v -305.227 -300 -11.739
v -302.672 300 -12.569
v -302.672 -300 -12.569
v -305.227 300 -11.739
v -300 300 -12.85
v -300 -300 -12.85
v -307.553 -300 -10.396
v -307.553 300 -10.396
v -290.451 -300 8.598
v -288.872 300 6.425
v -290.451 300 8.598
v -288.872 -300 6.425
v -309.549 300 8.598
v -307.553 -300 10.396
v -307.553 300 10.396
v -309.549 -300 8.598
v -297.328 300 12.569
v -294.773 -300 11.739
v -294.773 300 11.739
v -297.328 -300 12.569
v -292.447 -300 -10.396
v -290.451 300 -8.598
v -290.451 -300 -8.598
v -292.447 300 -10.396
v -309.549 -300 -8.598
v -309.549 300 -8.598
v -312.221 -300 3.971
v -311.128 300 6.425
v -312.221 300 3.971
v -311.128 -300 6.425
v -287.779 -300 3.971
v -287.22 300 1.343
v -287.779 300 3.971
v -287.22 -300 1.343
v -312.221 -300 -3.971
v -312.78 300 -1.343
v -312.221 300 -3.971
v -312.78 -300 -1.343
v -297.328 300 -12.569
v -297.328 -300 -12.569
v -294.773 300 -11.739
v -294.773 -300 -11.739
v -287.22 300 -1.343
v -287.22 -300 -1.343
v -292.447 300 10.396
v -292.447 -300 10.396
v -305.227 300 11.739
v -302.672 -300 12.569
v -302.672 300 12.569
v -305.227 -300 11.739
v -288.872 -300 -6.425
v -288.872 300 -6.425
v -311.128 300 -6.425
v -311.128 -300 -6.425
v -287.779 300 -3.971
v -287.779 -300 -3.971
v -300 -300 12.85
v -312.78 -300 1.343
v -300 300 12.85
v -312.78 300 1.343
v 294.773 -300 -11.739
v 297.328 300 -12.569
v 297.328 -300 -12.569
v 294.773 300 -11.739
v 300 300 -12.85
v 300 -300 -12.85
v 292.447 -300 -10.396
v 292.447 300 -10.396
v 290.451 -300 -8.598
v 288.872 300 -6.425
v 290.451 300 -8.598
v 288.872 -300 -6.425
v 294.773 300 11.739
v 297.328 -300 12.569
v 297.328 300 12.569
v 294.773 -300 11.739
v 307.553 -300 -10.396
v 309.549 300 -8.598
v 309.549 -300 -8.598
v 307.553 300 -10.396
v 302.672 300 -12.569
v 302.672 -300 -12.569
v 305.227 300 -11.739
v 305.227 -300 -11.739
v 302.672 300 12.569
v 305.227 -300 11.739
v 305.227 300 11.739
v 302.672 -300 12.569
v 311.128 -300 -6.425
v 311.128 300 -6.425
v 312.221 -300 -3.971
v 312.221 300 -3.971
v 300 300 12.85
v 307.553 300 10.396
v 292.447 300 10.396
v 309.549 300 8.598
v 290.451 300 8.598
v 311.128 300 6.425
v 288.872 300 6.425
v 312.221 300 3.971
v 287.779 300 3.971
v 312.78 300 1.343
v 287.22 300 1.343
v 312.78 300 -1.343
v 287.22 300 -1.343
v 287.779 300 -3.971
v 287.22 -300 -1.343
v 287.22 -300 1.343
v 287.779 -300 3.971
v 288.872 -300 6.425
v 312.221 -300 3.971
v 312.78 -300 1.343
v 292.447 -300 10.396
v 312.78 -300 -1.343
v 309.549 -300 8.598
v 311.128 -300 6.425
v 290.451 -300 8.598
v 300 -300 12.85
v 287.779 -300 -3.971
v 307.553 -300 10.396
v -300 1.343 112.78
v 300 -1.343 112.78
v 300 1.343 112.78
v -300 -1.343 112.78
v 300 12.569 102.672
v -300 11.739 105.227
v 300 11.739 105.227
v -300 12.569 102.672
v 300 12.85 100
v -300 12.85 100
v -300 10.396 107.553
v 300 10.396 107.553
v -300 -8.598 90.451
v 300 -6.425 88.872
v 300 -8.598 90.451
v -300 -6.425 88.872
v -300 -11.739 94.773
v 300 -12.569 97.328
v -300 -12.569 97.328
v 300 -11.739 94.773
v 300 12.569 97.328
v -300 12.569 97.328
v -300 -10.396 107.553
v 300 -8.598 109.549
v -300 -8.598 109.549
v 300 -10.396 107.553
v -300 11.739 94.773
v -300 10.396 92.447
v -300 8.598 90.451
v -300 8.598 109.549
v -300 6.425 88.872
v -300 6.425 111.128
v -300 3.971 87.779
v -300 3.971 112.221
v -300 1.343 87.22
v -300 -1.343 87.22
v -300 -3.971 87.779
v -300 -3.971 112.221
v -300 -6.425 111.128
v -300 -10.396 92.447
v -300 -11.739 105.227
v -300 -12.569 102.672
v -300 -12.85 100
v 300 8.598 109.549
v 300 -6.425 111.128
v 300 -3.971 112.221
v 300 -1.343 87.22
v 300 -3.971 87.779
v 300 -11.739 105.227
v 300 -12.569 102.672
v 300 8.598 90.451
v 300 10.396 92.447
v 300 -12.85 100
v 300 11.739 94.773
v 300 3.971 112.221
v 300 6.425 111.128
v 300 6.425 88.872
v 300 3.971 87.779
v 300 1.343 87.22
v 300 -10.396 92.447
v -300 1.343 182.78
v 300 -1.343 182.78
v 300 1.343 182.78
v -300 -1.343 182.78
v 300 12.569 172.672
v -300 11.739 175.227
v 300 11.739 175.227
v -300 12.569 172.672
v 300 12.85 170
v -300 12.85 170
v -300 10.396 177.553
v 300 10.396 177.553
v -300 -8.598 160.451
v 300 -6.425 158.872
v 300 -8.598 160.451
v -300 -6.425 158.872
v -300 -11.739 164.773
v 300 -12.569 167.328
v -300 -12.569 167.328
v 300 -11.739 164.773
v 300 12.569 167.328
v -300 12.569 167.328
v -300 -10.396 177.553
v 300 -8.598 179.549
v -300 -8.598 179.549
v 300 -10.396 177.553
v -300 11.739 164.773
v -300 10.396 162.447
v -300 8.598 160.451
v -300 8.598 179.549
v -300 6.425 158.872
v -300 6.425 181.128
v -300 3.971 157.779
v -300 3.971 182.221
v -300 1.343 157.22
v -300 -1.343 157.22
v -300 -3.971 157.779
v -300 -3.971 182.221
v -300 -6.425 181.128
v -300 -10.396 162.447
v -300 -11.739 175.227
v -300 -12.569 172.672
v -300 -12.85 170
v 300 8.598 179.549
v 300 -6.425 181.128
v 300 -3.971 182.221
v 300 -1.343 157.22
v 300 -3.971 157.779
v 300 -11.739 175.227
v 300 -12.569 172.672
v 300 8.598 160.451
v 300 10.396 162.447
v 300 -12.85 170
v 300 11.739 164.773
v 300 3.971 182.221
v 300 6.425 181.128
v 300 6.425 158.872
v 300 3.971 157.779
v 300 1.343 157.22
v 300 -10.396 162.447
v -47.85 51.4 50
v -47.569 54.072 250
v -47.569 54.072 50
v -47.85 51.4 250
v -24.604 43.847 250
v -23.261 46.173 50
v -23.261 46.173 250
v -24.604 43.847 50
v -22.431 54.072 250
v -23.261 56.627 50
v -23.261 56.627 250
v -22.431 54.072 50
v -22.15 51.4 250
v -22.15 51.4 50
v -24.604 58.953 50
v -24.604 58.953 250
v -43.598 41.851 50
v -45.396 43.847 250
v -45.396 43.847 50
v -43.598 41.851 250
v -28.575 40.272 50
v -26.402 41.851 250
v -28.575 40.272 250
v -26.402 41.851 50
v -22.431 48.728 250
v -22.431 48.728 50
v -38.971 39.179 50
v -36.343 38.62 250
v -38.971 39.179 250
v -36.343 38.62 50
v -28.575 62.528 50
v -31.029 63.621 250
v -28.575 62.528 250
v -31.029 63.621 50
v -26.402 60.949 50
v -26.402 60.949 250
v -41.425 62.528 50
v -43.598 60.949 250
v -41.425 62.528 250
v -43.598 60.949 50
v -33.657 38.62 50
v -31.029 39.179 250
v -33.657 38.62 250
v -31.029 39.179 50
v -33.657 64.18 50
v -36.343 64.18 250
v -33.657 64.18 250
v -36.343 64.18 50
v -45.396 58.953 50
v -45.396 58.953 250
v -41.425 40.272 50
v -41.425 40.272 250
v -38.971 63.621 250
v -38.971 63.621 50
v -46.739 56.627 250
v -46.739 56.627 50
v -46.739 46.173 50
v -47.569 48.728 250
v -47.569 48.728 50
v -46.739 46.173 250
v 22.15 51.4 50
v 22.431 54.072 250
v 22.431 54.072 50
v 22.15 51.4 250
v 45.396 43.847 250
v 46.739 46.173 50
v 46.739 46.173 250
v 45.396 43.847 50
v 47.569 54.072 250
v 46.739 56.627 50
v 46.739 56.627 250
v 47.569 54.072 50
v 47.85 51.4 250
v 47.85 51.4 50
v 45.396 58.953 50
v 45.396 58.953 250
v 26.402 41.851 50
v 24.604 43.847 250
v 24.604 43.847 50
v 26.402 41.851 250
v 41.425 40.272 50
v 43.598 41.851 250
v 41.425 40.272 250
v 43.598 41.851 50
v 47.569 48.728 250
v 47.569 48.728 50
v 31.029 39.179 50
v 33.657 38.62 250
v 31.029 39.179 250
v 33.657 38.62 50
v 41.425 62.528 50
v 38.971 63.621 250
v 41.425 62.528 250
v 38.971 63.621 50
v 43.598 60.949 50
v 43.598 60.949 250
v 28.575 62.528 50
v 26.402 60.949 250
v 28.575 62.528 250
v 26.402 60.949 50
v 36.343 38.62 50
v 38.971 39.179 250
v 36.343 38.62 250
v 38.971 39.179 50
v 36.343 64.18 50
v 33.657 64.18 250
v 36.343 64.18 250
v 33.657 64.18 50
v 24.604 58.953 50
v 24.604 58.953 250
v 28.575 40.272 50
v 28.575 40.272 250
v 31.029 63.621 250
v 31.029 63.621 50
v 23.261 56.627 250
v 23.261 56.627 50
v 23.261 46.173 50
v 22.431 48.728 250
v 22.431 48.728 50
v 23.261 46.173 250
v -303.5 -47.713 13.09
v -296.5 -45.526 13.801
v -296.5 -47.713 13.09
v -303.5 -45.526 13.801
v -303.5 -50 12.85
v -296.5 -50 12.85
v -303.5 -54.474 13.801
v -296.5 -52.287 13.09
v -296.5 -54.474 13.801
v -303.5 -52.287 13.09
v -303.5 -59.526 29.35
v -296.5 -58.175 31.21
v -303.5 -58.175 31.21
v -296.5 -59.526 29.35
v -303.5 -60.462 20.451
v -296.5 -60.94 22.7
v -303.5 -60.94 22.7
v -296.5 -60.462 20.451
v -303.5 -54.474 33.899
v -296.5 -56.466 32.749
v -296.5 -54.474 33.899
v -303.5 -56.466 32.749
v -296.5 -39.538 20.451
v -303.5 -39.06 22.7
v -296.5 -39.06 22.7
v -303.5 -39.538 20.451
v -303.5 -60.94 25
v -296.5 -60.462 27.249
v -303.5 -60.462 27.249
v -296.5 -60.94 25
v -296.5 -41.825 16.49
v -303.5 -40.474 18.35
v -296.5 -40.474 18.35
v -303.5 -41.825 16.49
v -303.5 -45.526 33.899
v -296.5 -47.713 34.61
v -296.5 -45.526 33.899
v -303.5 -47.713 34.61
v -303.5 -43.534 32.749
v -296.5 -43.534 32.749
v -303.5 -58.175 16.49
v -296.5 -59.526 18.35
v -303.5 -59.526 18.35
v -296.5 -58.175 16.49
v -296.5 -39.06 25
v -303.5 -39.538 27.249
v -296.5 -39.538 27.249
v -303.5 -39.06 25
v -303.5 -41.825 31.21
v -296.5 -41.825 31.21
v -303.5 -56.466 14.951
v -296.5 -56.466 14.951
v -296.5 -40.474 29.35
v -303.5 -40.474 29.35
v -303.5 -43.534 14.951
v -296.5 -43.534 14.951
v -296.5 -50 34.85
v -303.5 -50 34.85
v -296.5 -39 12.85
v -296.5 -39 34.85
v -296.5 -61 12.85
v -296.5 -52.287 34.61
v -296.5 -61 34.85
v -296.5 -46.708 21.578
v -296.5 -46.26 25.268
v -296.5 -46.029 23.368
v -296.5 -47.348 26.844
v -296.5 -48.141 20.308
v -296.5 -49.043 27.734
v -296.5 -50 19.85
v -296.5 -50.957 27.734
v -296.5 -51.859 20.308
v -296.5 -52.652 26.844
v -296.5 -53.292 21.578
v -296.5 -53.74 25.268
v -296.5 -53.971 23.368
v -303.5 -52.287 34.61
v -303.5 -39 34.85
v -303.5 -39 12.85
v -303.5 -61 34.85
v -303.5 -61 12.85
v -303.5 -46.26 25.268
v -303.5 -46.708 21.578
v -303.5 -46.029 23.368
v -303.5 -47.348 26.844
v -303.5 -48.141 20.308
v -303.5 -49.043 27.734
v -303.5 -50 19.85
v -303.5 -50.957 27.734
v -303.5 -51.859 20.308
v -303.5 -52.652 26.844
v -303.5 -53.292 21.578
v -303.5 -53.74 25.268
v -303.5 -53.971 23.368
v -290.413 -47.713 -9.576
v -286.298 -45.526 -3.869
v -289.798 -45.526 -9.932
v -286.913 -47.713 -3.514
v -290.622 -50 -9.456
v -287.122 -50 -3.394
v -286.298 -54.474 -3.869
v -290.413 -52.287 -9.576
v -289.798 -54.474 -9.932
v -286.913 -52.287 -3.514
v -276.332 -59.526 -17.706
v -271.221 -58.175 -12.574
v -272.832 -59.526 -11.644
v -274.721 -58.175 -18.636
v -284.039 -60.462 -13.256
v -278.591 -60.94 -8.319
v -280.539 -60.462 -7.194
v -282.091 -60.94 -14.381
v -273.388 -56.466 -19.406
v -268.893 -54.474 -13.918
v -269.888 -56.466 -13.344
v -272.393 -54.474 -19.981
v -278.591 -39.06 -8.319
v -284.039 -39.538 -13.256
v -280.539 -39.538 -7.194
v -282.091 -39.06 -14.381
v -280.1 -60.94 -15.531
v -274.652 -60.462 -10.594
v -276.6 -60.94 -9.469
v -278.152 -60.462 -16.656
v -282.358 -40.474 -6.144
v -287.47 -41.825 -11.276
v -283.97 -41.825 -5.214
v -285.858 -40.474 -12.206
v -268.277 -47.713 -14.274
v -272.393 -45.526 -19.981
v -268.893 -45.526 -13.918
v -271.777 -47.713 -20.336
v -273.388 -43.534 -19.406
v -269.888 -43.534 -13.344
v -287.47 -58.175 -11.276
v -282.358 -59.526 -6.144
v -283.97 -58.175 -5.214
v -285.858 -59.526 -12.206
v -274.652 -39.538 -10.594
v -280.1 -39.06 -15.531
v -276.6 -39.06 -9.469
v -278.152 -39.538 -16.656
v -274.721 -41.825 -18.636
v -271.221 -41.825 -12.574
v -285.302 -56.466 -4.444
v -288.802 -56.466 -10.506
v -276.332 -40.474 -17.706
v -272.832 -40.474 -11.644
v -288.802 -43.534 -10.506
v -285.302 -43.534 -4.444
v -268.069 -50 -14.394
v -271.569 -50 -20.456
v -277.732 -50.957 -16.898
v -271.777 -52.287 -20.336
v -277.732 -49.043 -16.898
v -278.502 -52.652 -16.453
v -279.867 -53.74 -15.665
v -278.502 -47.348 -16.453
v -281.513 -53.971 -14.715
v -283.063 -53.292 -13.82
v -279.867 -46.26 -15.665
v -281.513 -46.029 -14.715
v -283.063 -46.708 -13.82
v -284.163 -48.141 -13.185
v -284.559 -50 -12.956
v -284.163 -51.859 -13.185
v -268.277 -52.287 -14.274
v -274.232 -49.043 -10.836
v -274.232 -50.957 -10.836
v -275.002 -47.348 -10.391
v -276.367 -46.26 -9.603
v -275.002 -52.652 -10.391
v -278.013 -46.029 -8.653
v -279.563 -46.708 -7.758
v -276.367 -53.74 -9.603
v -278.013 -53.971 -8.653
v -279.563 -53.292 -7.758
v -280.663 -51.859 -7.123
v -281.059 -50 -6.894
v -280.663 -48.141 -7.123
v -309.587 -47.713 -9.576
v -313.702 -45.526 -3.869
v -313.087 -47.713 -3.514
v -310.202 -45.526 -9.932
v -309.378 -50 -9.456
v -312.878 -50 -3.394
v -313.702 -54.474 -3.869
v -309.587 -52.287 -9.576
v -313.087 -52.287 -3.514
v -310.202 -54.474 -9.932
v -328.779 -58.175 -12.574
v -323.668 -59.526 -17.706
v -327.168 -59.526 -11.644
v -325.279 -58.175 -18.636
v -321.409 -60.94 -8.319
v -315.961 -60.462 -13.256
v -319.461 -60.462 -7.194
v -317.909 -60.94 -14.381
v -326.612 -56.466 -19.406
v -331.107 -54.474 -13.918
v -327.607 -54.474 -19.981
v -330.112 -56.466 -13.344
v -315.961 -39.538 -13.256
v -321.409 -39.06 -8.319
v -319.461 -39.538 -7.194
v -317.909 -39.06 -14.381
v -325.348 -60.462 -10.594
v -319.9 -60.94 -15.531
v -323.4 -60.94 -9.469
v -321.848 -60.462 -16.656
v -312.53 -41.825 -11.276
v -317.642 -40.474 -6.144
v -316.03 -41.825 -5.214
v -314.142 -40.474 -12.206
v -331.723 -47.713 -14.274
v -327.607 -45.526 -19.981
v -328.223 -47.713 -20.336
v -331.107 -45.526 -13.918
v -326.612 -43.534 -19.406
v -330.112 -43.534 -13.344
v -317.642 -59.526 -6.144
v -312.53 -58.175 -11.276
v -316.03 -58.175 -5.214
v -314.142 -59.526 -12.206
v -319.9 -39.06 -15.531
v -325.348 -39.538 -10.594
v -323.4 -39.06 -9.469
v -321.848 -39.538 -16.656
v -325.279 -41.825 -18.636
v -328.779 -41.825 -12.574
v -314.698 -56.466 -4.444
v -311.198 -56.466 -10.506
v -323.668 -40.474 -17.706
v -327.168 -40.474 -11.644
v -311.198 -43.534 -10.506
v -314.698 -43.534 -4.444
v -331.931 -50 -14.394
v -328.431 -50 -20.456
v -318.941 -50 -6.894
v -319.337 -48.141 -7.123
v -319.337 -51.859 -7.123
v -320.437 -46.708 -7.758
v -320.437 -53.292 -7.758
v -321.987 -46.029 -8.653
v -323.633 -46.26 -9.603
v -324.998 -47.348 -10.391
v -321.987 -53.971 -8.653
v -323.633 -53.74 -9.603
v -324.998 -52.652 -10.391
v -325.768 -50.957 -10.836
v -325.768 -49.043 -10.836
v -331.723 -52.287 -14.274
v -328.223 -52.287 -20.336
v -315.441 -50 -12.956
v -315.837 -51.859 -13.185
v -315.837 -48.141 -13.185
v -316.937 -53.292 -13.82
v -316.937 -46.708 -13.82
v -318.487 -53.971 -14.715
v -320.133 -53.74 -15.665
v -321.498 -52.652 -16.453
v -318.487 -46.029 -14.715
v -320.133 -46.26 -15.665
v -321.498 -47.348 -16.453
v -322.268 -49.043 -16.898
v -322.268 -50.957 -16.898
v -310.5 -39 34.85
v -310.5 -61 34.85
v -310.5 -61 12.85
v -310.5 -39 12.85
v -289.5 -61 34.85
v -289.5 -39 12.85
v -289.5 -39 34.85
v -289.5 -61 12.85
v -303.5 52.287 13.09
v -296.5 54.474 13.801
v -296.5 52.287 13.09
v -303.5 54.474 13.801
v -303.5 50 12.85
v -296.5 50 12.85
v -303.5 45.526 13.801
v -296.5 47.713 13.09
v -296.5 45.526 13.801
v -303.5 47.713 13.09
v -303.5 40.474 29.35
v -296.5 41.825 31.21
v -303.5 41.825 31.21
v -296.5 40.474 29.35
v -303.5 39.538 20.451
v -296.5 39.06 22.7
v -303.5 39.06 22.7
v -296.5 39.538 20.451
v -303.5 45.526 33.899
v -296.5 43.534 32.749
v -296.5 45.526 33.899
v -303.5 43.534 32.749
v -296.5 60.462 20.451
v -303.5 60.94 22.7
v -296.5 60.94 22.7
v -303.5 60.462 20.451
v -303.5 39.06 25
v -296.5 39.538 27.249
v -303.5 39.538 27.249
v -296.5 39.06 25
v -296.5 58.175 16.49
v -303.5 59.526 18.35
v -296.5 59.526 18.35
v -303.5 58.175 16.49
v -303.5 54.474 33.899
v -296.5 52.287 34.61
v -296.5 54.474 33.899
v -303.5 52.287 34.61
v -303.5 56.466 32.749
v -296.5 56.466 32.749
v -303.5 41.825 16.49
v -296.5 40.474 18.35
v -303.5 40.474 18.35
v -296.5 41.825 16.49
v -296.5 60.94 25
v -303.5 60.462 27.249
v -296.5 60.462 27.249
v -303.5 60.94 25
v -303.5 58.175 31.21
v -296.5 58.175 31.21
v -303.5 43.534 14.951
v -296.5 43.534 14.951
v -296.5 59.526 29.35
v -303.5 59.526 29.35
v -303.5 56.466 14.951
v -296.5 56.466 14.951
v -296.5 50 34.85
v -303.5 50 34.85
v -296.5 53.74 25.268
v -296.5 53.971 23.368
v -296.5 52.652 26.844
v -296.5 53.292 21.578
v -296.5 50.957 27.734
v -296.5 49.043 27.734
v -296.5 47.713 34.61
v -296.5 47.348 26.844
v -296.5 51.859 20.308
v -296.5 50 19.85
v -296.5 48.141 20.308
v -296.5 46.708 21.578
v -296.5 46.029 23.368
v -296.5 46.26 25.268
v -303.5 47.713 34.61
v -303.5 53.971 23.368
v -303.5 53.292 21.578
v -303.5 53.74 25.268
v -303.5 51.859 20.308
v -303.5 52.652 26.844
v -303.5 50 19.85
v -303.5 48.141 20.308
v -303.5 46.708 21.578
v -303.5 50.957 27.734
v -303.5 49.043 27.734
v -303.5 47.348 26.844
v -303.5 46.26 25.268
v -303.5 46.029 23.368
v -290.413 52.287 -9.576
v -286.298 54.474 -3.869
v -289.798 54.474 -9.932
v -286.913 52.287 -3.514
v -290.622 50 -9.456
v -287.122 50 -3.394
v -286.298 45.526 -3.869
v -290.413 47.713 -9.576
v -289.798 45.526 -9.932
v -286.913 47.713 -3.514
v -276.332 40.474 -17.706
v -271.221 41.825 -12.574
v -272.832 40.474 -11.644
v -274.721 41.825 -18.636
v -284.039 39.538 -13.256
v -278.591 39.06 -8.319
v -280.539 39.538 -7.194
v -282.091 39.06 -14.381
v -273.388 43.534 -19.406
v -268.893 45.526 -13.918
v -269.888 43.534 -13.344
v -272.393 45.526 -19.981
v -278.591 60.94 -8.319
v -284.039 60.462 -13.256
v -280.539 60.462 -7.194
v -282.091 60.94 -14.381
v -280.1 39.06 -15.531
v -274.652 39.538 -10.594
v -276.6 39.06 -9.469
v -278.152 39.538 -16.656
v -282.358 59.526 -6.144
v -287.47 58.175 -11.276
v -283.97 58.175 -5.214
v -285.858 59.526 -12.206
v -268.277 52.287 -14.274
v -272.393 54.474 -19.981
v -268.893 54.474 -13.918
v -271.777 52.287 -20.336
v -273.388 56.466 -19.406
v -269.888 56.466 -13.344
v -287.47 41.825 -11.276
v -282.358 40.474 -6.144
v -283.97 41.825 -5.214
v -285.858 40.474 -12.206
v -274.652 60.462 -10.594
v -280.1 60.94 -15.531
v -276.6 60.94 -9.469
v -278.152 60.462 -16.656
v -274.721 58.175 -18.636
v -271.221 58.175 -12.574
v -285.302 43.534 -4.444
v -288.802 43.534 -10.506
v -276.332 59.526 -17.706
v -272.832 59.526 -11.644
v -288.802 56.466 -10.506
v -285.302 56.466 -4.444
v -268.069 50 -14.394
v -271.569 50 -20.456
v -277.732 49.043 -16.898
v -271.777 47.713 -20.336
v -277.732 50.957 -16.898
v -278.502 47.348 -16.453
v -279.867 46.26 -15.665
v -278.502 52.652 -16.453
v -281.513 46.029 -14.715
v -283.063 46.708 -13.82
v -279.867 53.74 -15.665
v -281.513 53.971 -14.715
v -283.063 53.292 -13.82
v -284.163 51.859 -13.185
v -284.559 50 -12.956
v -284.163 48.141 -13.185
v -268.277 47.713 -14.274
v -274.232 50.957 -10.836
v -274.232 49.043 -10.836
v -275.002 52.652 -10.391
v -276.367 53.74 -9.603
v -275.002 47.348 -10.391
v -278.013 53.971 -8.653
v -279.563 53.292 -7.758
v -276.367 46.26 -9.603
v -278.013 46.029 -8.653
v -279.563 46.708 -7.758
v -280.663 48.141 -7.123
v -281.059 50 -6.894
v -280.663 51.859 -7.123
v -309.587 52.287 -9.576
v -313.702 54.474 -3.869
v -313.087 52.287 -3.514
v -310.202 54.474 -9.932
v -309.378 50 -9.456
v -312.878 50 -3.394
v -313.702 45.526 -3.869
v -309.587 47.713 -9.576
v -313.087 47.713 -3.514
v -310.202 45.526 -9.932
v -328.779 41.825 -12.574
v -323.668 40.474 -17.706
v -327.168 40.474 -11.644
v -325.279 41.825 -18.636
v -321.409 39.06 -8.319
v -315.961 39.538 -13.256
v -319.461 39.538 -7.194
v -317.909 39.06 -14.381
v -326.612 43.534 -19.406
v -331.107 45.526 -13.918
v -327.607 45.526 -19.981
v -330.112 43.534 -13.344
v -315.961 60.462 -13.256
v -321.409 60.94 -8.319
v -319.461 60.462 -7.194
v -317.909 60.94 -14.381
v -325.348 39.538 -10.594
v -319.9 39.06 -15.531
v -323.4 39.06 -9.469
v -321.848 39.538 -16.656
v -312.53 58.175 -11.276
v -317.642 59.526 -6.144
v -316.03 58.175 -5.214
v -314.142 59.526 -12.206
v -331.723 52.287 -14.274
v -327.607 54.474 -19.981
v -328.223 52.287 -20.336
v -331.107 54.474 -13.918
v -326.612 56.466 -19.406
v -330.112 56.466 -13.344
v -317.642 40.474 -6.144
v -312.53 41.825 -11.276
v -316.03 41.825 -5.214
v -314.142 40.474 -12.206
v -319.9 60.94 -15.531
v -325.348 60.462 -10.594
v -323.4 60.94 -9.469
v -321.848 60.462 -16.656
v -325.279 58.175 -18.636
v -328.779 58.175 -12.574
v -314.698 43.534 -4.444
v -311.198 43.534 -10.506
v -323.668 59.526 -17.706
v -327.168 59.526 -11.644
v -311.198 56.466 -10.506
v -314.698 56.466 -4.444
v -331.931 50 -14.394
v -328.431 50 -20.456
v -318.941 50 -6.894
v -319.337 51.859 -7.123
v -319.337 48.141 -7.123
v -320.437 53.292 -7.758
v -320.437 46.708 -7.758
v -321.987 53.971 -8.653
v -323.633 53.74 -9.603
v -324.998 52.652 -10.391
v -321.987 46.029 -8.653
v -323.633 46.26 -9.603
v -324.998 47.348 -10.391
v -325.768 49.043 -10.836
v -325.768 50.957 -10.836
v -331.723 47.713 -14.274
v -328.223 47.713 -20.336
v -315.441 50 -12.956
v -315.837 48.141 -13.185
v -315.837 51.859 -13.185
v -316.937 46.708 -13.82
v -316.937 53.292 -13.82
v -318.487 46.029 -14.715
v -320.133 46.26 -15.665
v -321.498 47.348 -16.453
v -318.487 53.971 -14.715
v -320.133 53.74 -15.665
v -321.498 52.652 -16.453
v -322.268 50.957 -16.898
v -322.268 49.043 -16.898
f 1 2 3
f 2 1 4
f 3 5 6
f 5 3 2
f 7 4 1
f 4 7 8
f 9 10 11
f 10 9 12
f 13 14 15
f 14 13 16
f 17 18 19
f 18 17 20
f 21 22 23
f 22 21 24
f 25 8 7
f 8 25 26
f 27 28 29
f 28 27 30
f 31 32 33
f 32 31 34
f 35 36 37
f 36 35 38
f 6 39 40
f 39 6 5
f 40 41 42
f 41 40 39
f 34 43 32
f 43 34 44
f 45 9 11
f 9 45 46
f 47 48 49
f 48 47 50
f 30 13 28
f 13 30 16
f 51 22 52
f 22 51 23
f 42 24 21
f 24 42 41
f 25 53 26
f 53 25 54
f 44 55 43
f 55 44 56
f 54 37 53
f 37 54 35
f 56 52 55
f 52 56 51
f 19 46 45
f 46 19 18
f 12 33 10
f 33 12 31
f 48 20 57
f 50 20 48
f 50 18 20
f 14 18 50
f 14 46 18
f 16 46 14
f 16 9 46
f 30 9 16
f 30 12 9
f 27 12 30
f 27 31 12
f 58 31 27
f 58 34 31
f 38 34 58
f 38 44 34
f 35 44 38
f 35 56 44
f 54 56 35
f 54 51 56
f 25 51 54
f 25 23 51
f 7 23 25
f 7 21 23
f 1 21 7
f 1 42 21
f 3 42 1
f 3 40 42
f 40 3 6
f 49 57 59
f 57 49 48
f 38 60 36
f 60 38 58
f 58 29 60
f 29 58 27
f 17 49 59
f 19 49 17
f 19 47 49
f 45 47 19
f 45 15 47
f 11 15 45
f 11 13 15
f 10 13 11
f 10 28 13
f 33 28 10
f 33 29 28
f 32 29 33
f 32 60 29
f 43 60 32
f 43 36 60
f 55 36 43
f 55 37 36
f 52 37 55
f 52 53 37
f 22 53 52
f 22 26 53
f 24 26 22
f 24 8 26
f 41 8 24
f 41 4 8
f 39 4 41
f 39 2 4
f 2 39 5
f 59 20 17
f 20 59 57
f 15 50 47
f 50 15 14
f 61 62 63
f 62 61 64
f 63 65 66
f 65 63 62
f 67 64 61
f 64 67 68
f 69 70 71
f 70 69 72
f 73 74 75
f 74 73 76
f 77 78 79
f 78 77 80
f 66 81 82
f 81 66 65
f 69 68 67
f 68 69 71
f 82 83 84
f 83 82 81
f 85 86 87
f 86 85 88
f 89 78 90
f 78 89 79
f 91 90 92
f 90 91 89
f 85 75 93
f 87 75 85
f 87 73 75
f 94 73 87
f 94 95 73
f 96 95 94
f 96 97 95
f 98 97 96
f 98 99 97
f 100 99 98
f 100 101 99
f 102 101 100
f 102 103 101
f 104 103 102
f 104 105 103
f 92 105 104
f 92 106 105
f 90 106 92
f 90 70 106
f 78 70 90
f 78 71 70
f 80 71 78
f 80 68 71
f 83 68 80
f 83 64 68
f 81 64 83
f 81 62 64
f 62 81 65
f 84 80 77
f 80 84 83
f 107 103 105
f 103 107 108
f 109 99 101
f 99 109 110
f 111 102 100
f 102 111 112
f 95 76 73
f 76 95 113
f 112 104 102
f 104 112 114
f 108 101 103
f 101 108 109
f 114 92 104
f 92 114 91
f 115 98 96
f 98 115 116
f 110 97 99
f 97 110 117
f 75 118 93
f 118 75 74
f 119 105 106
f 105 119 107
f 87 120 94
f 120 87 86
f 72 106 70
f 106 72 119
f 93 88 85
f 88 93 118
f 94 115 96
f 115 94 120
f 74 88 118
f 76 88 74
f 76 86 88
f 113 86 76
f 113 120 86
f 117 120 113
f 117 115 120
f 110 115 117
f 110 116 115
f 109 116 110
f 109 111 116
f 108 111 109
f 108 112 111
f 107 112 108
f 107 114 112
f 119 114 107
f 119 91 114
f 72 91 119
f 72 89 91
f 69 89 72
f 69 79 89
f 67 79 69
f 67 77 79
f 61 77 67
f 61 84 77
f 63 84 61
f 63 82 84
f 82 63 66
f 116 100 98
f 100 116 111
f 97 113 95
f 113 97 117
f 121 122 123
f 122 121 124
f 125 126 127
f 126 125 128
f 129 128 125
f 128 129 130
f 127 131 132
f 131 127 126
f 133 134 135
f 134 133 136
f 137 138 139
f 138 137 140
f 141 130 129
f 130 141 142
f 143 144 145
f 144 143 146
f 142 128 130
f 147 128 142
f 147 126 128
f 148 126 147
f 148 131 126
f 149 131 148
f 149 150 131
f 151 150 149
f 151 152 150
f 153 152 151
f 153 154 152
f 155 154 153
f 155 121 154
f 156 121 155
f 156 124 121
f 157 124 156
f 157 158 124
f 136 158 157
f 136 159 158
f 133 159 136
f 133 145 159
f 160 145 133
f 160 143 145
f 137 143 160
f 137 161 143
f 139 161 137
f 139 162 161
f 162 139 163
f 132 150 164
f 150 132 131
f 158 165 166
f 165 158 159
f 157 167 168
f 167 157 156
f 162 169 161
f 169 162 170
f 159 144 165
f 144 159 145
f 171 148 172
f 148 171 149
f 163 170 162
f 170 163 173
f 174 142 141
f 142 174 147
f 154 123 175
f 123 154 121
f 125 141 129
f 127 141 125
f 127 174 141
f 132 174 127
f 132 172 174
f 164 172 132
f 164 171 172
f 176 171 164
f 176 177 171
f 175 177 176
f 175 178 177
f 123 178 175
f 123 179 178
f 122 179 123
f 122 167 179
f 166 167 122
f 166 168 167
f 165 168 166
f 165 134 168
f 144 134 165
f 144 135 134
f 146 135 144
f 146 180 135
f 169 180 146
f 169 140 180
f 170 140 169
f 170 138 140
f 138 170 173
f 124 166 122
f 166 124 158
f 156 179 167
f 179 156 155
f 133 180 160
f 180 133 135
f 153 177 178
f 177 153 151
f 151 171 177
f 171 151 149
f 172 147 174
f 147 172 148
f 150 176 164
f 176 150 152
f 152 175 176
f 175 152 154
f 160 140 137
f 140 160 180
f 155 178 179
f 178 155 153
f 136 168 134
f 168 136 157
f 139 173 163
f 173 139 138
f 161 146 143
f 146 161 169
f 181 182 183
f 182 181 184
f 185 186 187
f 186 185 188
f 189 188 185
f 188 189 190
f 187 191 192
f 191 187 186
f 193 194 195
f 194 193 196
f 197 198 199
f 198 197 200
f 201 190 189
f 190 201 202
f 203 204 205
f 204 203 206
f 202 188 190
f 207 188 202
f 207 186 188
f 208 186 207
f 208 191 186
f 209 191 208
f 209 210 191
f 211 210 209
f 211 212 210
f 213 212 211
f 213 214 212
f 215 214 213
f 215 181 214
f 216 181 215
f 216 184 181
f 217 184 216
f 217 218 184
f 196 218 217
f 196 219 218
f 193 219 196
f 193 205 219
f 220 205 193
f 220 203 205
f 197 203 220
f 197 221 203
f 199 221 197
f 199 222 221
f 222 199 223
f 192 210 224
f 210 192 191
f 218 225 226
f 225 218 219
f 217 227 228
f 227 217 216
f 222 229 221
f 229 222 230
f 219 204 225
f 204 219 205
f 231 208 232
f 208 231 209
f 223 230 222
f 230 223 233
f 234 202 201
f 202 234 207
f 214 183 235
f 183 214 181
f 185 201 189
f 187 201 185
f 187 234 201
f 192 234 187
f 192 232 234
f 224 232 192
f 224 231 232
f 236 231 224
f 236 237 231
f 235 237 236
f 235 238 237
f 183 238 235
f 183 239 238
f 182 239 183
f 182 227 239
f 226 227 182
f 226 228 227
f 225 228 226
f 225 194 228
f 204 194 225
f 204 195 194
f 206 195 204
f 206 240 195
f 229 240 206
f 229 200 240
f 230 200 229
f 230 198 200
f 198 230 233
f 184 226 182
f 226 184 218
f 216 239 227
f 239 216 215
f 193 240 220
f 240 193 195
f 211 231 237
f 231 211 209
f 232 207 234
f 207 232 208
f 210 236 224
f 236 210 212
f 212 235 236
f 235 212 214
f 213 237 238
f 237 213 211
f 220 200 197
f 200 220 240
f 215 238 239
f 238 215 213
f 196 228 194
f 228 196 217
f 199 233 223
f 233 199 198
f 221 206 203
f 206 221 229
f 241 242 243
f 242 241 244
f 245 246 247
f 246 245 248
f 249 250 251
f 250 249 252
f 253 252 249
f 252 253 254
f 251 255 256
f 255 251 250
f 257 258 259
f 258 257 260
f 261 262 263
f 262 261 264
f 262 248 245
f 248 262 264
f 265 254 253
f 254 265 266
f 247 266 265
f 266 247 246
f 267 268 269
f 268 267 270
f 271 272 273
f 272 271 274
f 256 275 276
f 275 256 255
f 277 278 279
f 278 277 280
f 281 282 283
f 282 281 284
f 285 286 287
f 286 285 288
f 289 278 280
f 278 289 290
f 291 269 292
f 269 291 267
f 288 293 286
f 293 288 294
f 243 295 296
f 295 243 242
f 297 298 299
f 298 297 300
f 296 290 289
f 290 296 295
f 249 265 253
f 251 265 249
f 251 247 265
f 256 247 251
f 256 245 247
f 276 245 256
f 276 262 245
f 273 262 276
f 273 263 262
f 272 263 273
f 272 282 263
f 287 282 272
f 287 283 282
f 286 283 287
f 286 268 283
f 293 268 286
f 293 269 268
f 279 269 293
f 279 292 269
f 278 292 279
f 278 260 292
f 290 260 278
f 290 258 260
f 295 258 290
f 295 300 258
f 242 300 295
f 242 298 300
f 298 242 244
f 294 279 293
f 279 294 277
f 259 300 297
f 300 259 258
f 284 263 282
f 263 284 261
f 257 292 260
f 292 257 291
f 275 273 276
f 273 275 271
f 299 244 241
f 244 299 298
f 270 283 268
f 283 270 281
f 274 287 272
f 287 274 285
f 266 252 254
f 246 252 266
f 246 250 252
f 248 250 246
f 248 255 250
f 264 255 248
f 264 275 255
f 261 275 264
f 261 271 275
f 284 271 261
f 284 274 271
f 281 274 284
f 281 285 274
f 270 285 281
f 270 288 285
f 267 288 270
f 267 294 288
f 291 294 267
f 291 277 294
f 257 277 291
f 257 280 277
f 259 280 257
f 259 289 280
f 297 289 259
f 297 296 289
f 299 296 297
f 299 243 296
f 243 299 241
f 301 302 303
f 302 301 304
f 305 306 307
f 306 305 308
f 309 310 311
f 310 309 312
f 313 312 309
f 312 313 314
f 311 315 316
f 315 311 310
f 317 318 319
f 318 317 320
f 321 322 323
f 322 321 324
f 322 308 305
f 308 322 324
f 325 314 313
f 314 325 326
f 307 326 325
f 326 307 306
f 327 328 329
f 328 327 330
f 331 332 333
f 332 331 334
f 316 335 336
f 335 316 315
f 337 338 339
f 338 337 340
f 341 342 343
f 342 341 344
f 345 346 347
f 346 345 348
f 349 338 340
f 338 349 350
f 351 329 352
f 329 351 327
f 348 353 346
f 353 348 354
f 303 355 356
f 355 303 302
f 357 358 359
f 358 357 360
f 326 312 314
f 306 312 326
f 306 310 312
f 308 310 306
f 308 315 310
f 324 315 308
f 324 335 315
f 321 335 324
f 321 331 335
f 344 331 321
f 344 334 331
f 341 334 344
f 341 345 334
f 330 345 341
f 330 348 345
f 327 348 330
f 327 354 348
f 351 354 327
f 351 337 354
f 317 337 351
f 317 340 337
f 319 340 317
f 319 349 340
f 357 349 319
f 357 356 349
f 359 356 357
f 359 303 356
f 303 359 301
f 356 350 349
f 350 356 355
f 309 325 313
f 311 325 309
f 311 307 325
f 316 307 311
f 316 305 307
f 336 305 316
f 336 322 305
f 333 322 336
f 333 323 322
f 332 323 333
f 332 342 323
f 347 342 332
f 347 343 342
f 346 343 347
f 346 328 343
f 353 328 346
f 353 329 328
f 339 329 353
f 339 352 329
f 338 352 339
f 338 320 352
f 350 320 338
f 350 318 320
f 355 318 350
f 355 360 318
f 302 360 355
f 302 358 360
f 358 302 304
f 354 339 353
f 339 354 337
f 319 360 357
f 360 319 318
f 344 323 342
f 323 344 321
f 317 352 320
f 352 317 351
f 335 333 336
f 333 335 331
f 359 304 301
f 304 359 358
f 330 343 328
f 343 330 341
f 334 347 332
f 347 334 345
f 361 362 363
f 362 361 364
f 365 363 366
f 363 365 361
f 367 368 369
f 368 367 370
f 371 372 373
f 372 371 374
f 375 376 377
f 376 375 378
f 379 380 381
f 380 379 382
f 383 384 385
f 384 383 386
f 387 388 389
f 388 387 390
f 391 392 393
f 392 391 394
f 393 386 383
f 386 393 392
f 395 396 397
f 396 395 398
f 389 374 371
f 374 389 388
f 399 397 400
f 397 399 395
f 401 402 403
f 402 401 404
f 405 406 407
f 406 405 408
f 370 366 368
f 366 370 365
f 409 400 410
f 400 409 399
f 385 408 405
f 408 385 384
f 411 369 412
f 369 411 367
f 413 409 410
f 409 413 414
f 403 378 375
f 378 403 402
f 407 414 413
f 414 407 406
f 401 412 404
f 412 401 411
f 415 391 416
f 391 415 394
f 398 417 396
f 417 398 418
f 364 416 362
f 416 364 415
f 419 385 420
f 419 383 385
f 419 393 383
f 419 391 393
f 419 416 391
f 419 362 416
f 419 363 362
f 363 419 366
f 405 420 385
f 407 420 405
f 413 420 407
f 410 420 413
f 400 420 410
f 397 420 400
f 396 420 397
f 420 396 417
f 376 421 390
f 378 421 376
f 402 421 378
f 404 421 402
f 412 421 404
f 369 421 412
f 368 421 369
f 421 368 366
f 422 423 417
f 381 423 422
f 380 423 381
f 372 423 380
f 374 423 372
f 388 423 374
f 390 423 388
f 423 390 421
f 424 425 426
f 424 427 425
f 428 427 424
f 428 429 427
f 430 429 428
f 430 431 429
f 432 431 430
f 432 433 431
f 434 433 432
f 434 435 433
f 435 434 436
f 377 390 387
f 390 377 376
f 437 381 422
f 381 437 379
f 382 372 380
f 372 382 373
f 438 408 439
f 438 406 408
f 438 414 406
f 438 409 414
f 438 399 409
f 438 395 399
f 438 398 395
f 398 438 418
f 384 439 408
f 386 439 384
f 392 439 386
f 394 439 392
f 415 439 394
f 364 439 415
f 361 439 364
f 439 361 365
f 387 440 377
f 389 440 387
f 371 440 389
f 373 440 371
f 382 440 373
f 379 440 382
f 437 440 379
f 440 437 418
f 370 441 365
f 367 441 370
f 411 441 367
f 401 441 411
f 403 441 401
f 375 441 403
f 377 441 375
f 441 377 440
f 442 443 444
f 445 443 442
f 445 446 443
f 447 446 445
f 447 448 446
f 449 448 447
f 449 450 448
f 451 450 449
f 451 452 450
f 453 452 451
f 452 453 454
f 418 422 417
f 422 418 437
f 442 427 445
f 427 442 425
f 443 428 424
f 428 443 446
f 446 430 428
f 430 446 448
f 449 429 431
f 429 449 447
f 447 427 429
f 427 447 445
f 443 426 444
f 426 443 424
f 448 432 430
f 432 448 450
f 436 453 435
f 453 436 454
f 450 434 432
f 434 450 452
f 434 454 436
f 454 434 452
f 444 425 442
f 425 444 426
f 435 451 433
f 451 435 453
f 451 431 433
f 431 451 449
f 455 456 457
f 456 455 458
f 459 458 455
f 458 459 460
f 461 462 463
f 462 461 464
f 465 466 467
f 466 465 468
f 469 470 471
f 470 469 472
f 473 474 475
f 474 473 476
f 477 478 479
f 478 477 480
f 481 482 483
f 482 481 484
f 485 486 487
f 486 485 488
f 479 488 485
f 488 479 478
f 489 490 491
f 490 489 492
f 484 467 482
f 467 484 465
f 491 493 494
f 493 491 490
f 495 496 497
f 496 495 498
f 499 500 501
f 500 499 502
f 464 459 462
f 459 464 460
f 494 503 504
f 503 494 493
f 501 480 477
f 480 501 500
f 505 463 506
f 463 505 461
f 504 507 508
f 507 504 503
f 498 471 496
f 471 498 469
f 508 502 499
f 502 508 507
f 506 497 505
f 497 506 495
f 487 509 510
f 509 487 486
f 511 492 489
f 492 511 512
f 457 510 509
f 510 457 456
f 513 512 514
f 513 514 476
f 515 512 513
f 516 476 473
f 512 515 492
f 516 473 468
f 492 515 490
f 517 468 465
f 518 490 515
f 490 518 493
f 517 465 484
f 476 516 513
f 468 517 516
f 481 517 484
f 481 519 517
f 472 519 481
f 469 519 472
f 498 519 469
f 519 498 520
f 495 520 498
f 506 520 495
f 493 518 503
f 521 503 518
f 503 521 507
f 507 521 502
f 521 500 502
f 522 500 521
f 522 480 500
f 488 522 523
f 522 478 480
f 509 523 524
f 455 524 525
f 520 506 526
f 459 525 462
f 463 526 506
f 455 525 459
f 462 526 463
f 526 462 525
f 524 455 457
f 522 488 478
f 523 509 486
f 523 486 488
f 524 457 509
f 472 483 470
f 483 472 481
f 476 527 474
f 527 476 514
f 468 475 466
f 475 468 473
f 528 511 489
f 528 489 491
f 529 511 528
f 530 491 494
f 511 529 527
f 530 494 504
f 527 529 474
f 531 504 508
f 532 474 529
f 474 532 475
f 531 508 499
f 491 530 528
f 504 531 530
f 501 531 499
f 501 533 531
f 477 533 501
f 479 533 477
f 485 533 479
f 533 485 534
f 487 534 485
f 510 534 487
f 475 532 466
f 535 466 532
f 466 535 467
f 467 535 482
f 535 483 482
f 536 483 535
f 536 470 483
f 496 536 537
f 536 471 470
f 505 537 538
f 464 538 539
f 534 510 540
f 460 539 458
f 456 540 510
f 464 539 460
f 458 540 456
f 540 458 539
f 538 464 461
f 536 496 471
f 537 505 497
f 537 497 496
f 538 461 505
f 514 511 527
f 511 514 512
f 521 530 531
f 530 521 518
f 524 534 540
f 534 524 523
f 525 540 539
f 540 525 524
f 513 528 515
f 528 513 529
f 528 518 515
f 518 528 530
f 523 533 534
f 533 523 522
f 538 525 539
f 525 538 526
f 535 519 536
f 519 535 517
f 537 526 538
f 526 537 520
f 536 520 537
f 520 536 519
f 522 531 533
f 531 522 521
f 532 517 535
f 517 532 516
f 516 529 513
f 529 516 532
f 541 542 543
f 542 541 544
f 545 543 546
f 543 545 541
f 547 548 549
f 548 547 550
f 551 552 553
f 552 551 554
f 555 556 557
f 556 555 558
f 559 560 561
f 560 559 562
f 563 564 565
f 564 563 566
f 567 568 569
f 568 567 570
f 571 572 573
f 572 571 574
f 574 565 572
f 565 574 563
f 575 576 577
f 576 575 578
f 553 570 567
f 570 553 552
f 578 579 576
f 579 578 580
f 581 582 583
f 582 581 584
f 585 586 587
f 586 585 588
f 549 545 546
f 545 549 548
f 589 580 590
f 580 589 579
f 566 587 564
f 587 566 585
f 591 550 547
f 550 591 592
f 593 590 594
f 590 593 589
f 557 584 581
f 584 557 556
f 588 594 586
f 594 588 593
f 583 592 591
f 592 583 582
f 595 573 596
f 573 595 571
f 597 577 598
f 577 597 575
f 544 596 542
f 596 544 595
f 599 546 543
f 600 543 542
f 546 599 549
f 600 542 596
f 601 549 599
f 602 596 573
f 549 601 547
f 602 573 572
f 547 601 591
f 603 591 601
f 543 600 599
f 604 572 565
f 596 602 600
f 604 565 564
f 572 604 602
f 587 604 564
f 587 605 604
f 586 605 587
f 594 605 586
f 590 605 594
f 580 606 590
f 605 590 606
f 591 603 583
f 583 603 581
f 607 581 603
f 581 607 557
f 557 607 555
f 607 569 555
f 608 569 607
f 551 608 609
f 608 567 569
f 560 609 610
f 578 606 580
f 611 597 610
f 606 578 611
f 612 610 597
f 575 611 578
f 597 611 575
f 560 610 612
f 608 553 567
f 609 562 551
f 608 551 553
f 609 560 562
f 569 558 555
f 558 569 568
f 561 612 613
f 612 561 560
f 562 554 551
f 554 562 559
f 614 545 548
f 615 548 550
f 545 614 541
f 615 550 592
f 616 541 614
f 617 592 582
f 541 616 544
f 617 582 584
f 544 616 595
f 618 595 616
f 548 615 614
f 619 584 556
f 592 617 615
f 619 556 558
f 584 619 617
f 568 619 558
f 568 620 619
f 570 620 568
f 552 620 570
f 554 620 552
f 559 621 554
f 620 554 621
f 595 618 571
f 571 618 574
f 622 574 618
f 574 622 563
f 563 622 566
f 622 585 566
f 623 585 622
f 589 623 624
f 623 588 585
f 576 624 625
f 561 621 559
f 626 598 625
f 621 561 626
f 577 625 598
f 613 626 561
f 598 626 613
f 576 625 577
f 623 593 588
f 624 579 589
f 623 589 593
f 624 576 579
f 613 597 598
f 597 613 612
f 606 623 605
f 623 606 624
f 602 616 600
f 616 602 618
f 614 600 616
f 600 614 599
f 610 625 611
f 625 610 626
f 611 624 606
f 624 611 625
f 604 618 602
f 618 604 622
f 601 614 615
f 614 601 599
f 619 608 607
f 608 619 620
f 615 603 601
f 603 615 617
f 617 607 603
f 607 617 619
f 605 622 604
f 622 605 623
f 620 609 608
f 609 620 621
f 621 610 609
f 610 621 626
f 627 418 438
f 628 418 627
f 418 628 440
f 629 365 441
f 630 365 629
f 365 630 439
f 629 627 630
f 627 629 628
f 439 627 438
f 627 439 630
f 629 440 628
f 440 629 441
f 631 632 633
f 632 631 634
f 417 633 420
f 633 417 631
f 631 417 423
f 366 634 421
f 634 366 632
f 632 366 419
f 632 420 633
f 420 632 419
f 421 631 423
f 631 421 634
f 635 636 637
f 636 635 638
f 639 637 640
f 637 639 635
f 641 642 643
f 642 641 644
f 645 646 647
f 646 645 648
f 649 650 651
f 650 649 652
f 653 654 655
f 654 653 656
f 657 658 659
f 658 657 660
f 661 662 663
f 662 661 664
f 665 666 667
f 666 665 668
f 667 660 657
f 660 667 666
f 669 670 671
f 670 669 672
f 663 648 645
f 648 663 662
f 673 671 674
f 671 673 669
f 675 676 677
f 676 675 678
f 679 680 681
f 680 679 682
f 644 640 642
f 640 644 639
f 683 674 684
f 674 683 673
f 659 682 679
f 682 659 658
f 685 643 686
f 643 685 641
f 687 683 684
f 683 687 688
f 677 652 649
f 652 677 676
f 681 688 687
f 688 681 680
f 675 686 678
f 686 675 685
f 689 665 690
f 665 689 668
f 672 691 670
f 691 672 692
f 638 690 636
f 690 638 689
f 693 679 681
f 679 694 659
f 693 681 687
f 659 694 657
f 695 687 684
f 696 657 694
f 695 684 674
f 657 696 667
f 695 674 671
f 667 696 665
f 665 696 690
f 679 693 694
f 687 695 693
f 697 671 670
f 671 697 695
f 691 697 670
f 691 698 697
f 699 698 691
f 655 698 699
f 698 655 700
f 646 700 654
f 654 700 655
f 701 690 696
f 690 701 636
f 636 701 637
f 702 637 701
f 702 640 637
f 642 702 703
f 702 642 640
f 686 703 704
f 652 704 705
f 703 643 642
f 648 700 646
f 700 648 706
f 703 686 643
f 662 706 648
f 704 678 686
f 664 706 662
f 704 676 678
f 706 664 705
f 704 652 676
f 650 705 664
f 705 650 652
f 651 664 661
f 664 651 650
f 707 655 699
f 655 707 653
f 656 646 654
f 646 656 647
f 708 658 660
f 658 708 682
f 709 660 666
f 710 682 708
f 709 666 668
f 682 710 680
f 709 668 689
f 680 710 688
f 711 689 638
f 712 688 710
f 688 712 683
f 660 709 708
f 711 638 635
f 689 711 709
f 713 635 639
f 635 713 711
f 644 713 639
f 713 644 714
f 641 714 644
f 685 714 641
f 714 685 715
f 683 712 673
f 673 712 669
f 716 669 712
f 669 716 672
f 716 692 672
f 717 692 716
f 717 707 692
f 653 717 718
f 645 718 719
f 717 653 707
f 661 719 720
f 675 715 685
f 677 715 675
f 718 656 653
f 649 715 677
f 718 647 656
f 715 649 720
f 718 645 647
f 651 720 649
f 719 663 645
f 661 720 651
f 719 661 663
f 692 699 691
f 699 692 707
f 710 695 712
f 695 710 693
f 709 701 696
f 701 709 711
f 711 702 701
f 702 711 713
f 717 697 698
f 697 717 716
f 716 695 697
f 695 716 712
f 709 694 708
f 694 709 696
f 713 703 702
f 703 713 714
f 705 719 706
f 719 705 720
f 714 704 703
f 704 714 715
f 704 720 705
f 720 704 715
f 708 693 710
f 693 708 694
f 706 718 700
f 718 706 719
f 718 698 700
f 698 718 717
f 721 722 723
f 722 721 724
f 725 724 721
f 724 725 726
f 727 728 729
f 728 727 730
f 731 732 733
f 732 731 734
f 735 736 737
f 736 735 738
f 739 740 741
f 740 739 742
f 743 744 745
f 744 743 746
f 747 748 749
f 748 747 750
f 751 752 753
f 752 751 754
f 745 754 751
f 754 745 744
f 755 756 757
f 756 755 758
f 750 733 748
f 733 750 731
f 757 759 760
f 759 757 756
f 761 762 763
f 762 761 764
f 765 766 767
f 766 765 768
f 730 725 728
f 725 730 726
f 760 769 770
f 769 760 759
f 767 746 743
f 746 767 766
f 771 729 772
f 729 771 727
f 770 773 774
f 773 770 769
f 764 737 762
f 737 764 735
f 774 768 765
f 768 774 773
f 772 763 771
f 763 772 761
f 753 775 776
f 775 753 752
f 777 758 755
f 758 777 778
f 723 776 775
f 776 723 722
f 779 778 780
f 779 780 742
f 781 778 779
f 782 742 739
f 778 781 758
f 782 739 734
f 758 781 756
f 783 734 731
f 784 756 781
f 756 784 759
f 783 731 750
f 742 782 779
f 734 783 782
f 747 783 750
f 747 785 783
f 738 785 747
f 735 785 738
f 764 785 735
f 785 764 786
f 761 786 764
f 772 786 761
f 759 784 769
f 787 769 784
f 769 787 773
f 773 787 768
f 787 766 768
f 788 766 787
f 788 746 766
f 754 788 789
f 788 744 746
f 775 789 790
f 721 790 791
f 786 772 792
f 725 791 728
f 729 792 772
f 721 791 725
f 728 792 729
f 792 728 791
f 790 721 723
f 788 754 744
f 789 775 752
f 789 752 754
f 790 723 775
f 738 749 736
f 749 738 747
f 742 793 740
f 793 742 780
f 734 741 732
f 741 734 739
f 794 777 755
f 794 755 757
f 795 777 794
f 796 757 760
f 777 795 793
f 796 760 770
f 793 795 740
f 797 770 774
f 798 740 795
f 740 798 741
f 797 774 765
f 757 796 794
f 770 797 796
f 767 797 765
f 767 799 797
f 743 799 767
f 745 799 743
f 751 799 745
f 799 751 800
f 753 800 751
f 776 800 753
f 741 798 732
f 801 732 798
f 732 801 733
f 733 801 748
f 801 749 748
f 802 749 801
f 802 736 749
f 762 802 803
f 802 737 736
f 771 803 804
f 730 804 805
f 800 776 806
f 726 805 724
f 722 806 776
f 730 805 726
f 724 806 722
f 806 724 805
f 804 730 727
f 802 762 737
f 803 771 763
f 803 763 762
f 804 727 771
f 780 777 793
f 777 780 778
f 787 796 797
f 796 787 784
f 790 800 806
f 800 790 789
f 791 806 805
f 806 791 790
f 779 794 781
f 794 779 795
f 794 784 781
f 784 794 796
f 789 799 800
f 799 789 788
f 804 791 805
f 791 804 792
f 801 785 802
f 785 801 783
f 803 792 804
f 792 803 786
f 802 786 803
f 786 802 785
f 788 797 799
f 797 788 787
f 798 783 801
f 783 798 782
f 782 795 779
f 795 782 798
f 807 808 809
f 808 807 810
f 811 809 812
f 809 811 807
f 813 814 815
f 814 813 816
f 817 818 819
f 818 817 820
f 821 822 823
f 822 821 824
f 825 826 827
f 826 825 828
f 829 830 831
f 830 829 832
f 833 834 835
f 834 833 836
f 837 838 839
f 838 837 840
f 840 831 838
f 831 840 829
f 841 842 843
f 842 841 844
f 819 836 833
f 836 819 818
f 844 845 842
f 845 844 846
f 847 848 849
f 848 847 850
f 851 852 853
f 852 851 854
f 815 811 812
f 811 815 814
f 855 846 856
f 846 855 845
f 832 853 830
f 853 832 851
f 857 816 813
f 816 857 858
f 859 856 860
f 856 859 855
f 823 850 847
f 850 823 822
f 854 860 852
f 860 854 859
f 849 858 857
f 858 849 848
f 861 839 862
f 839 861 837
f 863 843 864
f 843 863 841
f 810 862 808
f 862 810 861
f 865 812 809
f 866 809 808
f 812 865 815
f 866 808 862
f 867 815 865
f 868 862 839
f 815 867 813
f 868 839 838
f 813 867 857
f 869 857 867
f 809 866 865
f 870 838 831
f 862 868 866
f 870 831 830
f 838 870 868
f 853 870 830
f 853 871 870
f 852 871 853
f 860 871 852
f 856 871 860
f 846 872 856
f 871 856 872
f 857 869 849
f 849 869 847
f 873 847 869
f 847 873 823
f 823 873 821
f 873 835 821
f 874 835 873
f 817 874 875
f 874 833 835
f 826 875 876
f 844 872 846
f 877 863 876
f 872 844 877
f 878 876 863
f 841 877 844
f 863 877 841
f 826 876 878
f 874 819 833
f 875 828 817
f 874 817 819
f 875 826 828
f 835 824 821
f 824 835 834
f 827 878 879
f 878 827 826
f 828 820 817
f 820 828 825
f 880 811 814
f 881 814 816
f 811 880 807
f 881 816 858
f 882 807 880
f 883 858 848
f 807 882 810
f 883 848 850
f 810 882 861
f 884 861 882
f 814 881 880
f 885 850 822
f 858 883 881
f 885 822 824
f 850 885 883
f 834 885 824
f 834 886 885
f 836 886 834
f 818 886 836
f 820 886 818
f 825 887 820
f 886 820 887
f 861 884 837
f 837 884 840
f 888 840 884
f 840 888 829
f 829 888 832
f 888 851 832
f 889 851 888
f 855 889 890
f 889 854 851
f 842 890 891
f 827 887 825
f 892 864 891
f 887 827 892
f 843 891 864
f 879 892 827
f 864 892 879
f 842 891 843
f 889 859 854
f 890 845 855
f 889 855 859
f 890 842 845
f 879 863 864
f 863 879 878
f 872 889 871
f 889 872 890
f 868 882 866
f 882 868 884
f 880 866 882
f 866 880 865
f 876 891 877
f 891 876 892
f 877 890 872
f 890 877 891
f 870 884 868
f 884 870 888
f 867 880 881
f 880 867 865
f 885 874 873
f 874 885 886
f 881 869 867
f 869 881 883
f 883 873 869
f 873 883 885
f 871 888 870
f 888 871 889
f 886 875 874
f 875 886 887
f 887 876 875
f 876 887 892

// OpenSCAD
// Constants

rod_diameter = 25.7;
y_rail_spacing = 600;
y_length = 600;

x_rail_spacing = 70;
x_rail_vertical_offset = 100;
x_length = y_rail_spacing;

z_rail_spacing = 70;
z_rail_offset_from_x_axis = rod_diameter * 2;
z_rail_vertical_offset = x_rail_vertical_offset;
z_length = 200;

color("green", alpha = 0.05) Y_rails();
color("red", alpha = 0.05) X_rails();
color("blue", alpha = 0.05) Z_rails();
color("pink", alpha = 0.2) Y_carriages();

module
Y_rails()
{
    translate([ -y_rail_spacing / 2, 0 ]) rotate([ 0, 90, 90 ])
        cylinder(h = y_length, d = rod_diameter, center = true);
    translate([ y_rail_spacing / 2, 0 ]) rotate([ 0, 90, 90 ])
        cylinder(h = y_length, d = rod_diameter, center = true);
}

module
X_rails()
{
    translate([ 0, 0, x_rail_vertical_offset ]) rotate([ 90, 0, 90 ])
        cylinder(h = x_length, d = rod_diameter, center = true);
    translate([ 0, 0, x_rail_vertical_offset + x_rail_spacing ])
        rotate([ 90, 0, 90 ])
            cylinder(h = x_length, d = rod_diameter, center = true);
}

module
Z_rails()
{
    z_offset = x_rail_vertical_offset + x_rail_vertical_offset / 2;
    translate([ -z_rail_spacing / 2, z_rail_offset_from_x_axis, z_offset ])
        rotate([ 0, 0, 0 ])
            cylinder(h = z_length, d = rod_diameter, center = true);
    translate([ z_rail_spacing / 2, z_rail_offset_from_x_axis, z_offset ])
        rotate([ 0, 0, 0 ])
            cylinder(h = z_length, d = rod_diameter, center = true);
}

module Bearing(id, od, width)
{
    difference()
    {
        cylinder(h = width, d = od, center = true);
        cylinder(h = width, d = id, center = true);
    }
}

module Bearing_pack(id, od, width, rod_diameter, number)
{
    angular_seperation = 360 / number;
    for (i = [0:number - 1]) {
        echo(str("b = ", i));
        rotate([ 0, angular_seperation * i, 0 ])
            translate([ 0, 0, rod_diameter / 2 + od / 2 ]) rotate([ 0, 90, 0 ])
                Bearing(id = id, od = od, width = width);
    }
}

module Bearing_holder(base_only = false)
{
    translate([ 0, 0, -1.5 * od ])
    {
        difference()
        {
            union()
            {
                difference()
                {
                    hull()
                    {
                        translate(
                            [ -od / 2, -thickness - bearing_width / 2, 0 ])
                            cube([
                                od,
                                thickness * 2 + bearing_width,
                                thickness
                            ]);
                        if (base_only == false) {
                            translate(
                                [ 0, (thickness * 2 + bearing_width) / 2, od ])
                                rotate([ 90, 0, 0 ])
                                    cylinder(h = thickness * 2 + bearing_width,
                                             d = id + (od - id) / 2);
                        }
                    }
                    translate([
                        0,
                        bearing_width * (1 + bearing_clearance_precentage) / 2,
                        od
                    ]) rotate([ 90, 0, 0 ])
                        cylinder(h = bearing_width *
                                     (1 + bearing_clearance_precentage),
                                 d = od * (1 + bearing_clearance_precentage));
                }
                if (base_only == false) {
                    difference()
                    {
                        translate(
                            [ 0, (thickness * 2 + bearing_width) / 2, od ])
                            rotate([ 90, 0, 0 ])
                                cylinder(h = thickness * 2 + bearing_width,
                                         d = id + (od - id) / 4);
                        translate([ 0, (bearing_width) / 2, od ])
                            rotate([ 90, 0, 0 ]) cylinder(
                                h = bearing_width, d = id + (od - id) / 2);
                    }
                }
            }
            translate([ 0, (thickness * 2 + bearing_width) / 2, od ])
                rotate([ 90, 0, 0 ])
                    cylinder(h = thickness * 2 + bearing_width, d = id);
        }
    }
}

module
Y_carriages()
{
    translate([ -y_rail_spacing / 2, 0, 0 ]) Y_carriage();
}

module
Y_carriage()
{
    bearing_seperation = 100;
    bearing_od = 22;
    bearing_id = 8;
    bearing_width = 7;
    translate([ 0, -bearing_seperation / 2, 0 ])
    {
        Bearing_pack(od = bearing_od,
                     id = bearing_id,
                     width = bearing_width,
                     rod_diameter = rod_diameter,
                     number = 3);
        translate([ 0, 0, rod_diameter / 2 + bearing_od / 2 ])
        {
            translate([ -bearing_width, 0, 0 ])
                cube([ bearing_width, bearing_od, bearing_od ], center = true);
            translate([ +bearing_width, 0, 0 ])
                cube([ bearing_width, bearing_od, bearing_od ], center = true);
        }
    }
    translate([ 0, bearing_seperation / 2, 0 ])
        Bearing_pack(od = bearing_od,
                     id = bearing_id,
                     width = bearing_width,
                     rod_diameter = rod_diameter,
                     number = 3);
}
